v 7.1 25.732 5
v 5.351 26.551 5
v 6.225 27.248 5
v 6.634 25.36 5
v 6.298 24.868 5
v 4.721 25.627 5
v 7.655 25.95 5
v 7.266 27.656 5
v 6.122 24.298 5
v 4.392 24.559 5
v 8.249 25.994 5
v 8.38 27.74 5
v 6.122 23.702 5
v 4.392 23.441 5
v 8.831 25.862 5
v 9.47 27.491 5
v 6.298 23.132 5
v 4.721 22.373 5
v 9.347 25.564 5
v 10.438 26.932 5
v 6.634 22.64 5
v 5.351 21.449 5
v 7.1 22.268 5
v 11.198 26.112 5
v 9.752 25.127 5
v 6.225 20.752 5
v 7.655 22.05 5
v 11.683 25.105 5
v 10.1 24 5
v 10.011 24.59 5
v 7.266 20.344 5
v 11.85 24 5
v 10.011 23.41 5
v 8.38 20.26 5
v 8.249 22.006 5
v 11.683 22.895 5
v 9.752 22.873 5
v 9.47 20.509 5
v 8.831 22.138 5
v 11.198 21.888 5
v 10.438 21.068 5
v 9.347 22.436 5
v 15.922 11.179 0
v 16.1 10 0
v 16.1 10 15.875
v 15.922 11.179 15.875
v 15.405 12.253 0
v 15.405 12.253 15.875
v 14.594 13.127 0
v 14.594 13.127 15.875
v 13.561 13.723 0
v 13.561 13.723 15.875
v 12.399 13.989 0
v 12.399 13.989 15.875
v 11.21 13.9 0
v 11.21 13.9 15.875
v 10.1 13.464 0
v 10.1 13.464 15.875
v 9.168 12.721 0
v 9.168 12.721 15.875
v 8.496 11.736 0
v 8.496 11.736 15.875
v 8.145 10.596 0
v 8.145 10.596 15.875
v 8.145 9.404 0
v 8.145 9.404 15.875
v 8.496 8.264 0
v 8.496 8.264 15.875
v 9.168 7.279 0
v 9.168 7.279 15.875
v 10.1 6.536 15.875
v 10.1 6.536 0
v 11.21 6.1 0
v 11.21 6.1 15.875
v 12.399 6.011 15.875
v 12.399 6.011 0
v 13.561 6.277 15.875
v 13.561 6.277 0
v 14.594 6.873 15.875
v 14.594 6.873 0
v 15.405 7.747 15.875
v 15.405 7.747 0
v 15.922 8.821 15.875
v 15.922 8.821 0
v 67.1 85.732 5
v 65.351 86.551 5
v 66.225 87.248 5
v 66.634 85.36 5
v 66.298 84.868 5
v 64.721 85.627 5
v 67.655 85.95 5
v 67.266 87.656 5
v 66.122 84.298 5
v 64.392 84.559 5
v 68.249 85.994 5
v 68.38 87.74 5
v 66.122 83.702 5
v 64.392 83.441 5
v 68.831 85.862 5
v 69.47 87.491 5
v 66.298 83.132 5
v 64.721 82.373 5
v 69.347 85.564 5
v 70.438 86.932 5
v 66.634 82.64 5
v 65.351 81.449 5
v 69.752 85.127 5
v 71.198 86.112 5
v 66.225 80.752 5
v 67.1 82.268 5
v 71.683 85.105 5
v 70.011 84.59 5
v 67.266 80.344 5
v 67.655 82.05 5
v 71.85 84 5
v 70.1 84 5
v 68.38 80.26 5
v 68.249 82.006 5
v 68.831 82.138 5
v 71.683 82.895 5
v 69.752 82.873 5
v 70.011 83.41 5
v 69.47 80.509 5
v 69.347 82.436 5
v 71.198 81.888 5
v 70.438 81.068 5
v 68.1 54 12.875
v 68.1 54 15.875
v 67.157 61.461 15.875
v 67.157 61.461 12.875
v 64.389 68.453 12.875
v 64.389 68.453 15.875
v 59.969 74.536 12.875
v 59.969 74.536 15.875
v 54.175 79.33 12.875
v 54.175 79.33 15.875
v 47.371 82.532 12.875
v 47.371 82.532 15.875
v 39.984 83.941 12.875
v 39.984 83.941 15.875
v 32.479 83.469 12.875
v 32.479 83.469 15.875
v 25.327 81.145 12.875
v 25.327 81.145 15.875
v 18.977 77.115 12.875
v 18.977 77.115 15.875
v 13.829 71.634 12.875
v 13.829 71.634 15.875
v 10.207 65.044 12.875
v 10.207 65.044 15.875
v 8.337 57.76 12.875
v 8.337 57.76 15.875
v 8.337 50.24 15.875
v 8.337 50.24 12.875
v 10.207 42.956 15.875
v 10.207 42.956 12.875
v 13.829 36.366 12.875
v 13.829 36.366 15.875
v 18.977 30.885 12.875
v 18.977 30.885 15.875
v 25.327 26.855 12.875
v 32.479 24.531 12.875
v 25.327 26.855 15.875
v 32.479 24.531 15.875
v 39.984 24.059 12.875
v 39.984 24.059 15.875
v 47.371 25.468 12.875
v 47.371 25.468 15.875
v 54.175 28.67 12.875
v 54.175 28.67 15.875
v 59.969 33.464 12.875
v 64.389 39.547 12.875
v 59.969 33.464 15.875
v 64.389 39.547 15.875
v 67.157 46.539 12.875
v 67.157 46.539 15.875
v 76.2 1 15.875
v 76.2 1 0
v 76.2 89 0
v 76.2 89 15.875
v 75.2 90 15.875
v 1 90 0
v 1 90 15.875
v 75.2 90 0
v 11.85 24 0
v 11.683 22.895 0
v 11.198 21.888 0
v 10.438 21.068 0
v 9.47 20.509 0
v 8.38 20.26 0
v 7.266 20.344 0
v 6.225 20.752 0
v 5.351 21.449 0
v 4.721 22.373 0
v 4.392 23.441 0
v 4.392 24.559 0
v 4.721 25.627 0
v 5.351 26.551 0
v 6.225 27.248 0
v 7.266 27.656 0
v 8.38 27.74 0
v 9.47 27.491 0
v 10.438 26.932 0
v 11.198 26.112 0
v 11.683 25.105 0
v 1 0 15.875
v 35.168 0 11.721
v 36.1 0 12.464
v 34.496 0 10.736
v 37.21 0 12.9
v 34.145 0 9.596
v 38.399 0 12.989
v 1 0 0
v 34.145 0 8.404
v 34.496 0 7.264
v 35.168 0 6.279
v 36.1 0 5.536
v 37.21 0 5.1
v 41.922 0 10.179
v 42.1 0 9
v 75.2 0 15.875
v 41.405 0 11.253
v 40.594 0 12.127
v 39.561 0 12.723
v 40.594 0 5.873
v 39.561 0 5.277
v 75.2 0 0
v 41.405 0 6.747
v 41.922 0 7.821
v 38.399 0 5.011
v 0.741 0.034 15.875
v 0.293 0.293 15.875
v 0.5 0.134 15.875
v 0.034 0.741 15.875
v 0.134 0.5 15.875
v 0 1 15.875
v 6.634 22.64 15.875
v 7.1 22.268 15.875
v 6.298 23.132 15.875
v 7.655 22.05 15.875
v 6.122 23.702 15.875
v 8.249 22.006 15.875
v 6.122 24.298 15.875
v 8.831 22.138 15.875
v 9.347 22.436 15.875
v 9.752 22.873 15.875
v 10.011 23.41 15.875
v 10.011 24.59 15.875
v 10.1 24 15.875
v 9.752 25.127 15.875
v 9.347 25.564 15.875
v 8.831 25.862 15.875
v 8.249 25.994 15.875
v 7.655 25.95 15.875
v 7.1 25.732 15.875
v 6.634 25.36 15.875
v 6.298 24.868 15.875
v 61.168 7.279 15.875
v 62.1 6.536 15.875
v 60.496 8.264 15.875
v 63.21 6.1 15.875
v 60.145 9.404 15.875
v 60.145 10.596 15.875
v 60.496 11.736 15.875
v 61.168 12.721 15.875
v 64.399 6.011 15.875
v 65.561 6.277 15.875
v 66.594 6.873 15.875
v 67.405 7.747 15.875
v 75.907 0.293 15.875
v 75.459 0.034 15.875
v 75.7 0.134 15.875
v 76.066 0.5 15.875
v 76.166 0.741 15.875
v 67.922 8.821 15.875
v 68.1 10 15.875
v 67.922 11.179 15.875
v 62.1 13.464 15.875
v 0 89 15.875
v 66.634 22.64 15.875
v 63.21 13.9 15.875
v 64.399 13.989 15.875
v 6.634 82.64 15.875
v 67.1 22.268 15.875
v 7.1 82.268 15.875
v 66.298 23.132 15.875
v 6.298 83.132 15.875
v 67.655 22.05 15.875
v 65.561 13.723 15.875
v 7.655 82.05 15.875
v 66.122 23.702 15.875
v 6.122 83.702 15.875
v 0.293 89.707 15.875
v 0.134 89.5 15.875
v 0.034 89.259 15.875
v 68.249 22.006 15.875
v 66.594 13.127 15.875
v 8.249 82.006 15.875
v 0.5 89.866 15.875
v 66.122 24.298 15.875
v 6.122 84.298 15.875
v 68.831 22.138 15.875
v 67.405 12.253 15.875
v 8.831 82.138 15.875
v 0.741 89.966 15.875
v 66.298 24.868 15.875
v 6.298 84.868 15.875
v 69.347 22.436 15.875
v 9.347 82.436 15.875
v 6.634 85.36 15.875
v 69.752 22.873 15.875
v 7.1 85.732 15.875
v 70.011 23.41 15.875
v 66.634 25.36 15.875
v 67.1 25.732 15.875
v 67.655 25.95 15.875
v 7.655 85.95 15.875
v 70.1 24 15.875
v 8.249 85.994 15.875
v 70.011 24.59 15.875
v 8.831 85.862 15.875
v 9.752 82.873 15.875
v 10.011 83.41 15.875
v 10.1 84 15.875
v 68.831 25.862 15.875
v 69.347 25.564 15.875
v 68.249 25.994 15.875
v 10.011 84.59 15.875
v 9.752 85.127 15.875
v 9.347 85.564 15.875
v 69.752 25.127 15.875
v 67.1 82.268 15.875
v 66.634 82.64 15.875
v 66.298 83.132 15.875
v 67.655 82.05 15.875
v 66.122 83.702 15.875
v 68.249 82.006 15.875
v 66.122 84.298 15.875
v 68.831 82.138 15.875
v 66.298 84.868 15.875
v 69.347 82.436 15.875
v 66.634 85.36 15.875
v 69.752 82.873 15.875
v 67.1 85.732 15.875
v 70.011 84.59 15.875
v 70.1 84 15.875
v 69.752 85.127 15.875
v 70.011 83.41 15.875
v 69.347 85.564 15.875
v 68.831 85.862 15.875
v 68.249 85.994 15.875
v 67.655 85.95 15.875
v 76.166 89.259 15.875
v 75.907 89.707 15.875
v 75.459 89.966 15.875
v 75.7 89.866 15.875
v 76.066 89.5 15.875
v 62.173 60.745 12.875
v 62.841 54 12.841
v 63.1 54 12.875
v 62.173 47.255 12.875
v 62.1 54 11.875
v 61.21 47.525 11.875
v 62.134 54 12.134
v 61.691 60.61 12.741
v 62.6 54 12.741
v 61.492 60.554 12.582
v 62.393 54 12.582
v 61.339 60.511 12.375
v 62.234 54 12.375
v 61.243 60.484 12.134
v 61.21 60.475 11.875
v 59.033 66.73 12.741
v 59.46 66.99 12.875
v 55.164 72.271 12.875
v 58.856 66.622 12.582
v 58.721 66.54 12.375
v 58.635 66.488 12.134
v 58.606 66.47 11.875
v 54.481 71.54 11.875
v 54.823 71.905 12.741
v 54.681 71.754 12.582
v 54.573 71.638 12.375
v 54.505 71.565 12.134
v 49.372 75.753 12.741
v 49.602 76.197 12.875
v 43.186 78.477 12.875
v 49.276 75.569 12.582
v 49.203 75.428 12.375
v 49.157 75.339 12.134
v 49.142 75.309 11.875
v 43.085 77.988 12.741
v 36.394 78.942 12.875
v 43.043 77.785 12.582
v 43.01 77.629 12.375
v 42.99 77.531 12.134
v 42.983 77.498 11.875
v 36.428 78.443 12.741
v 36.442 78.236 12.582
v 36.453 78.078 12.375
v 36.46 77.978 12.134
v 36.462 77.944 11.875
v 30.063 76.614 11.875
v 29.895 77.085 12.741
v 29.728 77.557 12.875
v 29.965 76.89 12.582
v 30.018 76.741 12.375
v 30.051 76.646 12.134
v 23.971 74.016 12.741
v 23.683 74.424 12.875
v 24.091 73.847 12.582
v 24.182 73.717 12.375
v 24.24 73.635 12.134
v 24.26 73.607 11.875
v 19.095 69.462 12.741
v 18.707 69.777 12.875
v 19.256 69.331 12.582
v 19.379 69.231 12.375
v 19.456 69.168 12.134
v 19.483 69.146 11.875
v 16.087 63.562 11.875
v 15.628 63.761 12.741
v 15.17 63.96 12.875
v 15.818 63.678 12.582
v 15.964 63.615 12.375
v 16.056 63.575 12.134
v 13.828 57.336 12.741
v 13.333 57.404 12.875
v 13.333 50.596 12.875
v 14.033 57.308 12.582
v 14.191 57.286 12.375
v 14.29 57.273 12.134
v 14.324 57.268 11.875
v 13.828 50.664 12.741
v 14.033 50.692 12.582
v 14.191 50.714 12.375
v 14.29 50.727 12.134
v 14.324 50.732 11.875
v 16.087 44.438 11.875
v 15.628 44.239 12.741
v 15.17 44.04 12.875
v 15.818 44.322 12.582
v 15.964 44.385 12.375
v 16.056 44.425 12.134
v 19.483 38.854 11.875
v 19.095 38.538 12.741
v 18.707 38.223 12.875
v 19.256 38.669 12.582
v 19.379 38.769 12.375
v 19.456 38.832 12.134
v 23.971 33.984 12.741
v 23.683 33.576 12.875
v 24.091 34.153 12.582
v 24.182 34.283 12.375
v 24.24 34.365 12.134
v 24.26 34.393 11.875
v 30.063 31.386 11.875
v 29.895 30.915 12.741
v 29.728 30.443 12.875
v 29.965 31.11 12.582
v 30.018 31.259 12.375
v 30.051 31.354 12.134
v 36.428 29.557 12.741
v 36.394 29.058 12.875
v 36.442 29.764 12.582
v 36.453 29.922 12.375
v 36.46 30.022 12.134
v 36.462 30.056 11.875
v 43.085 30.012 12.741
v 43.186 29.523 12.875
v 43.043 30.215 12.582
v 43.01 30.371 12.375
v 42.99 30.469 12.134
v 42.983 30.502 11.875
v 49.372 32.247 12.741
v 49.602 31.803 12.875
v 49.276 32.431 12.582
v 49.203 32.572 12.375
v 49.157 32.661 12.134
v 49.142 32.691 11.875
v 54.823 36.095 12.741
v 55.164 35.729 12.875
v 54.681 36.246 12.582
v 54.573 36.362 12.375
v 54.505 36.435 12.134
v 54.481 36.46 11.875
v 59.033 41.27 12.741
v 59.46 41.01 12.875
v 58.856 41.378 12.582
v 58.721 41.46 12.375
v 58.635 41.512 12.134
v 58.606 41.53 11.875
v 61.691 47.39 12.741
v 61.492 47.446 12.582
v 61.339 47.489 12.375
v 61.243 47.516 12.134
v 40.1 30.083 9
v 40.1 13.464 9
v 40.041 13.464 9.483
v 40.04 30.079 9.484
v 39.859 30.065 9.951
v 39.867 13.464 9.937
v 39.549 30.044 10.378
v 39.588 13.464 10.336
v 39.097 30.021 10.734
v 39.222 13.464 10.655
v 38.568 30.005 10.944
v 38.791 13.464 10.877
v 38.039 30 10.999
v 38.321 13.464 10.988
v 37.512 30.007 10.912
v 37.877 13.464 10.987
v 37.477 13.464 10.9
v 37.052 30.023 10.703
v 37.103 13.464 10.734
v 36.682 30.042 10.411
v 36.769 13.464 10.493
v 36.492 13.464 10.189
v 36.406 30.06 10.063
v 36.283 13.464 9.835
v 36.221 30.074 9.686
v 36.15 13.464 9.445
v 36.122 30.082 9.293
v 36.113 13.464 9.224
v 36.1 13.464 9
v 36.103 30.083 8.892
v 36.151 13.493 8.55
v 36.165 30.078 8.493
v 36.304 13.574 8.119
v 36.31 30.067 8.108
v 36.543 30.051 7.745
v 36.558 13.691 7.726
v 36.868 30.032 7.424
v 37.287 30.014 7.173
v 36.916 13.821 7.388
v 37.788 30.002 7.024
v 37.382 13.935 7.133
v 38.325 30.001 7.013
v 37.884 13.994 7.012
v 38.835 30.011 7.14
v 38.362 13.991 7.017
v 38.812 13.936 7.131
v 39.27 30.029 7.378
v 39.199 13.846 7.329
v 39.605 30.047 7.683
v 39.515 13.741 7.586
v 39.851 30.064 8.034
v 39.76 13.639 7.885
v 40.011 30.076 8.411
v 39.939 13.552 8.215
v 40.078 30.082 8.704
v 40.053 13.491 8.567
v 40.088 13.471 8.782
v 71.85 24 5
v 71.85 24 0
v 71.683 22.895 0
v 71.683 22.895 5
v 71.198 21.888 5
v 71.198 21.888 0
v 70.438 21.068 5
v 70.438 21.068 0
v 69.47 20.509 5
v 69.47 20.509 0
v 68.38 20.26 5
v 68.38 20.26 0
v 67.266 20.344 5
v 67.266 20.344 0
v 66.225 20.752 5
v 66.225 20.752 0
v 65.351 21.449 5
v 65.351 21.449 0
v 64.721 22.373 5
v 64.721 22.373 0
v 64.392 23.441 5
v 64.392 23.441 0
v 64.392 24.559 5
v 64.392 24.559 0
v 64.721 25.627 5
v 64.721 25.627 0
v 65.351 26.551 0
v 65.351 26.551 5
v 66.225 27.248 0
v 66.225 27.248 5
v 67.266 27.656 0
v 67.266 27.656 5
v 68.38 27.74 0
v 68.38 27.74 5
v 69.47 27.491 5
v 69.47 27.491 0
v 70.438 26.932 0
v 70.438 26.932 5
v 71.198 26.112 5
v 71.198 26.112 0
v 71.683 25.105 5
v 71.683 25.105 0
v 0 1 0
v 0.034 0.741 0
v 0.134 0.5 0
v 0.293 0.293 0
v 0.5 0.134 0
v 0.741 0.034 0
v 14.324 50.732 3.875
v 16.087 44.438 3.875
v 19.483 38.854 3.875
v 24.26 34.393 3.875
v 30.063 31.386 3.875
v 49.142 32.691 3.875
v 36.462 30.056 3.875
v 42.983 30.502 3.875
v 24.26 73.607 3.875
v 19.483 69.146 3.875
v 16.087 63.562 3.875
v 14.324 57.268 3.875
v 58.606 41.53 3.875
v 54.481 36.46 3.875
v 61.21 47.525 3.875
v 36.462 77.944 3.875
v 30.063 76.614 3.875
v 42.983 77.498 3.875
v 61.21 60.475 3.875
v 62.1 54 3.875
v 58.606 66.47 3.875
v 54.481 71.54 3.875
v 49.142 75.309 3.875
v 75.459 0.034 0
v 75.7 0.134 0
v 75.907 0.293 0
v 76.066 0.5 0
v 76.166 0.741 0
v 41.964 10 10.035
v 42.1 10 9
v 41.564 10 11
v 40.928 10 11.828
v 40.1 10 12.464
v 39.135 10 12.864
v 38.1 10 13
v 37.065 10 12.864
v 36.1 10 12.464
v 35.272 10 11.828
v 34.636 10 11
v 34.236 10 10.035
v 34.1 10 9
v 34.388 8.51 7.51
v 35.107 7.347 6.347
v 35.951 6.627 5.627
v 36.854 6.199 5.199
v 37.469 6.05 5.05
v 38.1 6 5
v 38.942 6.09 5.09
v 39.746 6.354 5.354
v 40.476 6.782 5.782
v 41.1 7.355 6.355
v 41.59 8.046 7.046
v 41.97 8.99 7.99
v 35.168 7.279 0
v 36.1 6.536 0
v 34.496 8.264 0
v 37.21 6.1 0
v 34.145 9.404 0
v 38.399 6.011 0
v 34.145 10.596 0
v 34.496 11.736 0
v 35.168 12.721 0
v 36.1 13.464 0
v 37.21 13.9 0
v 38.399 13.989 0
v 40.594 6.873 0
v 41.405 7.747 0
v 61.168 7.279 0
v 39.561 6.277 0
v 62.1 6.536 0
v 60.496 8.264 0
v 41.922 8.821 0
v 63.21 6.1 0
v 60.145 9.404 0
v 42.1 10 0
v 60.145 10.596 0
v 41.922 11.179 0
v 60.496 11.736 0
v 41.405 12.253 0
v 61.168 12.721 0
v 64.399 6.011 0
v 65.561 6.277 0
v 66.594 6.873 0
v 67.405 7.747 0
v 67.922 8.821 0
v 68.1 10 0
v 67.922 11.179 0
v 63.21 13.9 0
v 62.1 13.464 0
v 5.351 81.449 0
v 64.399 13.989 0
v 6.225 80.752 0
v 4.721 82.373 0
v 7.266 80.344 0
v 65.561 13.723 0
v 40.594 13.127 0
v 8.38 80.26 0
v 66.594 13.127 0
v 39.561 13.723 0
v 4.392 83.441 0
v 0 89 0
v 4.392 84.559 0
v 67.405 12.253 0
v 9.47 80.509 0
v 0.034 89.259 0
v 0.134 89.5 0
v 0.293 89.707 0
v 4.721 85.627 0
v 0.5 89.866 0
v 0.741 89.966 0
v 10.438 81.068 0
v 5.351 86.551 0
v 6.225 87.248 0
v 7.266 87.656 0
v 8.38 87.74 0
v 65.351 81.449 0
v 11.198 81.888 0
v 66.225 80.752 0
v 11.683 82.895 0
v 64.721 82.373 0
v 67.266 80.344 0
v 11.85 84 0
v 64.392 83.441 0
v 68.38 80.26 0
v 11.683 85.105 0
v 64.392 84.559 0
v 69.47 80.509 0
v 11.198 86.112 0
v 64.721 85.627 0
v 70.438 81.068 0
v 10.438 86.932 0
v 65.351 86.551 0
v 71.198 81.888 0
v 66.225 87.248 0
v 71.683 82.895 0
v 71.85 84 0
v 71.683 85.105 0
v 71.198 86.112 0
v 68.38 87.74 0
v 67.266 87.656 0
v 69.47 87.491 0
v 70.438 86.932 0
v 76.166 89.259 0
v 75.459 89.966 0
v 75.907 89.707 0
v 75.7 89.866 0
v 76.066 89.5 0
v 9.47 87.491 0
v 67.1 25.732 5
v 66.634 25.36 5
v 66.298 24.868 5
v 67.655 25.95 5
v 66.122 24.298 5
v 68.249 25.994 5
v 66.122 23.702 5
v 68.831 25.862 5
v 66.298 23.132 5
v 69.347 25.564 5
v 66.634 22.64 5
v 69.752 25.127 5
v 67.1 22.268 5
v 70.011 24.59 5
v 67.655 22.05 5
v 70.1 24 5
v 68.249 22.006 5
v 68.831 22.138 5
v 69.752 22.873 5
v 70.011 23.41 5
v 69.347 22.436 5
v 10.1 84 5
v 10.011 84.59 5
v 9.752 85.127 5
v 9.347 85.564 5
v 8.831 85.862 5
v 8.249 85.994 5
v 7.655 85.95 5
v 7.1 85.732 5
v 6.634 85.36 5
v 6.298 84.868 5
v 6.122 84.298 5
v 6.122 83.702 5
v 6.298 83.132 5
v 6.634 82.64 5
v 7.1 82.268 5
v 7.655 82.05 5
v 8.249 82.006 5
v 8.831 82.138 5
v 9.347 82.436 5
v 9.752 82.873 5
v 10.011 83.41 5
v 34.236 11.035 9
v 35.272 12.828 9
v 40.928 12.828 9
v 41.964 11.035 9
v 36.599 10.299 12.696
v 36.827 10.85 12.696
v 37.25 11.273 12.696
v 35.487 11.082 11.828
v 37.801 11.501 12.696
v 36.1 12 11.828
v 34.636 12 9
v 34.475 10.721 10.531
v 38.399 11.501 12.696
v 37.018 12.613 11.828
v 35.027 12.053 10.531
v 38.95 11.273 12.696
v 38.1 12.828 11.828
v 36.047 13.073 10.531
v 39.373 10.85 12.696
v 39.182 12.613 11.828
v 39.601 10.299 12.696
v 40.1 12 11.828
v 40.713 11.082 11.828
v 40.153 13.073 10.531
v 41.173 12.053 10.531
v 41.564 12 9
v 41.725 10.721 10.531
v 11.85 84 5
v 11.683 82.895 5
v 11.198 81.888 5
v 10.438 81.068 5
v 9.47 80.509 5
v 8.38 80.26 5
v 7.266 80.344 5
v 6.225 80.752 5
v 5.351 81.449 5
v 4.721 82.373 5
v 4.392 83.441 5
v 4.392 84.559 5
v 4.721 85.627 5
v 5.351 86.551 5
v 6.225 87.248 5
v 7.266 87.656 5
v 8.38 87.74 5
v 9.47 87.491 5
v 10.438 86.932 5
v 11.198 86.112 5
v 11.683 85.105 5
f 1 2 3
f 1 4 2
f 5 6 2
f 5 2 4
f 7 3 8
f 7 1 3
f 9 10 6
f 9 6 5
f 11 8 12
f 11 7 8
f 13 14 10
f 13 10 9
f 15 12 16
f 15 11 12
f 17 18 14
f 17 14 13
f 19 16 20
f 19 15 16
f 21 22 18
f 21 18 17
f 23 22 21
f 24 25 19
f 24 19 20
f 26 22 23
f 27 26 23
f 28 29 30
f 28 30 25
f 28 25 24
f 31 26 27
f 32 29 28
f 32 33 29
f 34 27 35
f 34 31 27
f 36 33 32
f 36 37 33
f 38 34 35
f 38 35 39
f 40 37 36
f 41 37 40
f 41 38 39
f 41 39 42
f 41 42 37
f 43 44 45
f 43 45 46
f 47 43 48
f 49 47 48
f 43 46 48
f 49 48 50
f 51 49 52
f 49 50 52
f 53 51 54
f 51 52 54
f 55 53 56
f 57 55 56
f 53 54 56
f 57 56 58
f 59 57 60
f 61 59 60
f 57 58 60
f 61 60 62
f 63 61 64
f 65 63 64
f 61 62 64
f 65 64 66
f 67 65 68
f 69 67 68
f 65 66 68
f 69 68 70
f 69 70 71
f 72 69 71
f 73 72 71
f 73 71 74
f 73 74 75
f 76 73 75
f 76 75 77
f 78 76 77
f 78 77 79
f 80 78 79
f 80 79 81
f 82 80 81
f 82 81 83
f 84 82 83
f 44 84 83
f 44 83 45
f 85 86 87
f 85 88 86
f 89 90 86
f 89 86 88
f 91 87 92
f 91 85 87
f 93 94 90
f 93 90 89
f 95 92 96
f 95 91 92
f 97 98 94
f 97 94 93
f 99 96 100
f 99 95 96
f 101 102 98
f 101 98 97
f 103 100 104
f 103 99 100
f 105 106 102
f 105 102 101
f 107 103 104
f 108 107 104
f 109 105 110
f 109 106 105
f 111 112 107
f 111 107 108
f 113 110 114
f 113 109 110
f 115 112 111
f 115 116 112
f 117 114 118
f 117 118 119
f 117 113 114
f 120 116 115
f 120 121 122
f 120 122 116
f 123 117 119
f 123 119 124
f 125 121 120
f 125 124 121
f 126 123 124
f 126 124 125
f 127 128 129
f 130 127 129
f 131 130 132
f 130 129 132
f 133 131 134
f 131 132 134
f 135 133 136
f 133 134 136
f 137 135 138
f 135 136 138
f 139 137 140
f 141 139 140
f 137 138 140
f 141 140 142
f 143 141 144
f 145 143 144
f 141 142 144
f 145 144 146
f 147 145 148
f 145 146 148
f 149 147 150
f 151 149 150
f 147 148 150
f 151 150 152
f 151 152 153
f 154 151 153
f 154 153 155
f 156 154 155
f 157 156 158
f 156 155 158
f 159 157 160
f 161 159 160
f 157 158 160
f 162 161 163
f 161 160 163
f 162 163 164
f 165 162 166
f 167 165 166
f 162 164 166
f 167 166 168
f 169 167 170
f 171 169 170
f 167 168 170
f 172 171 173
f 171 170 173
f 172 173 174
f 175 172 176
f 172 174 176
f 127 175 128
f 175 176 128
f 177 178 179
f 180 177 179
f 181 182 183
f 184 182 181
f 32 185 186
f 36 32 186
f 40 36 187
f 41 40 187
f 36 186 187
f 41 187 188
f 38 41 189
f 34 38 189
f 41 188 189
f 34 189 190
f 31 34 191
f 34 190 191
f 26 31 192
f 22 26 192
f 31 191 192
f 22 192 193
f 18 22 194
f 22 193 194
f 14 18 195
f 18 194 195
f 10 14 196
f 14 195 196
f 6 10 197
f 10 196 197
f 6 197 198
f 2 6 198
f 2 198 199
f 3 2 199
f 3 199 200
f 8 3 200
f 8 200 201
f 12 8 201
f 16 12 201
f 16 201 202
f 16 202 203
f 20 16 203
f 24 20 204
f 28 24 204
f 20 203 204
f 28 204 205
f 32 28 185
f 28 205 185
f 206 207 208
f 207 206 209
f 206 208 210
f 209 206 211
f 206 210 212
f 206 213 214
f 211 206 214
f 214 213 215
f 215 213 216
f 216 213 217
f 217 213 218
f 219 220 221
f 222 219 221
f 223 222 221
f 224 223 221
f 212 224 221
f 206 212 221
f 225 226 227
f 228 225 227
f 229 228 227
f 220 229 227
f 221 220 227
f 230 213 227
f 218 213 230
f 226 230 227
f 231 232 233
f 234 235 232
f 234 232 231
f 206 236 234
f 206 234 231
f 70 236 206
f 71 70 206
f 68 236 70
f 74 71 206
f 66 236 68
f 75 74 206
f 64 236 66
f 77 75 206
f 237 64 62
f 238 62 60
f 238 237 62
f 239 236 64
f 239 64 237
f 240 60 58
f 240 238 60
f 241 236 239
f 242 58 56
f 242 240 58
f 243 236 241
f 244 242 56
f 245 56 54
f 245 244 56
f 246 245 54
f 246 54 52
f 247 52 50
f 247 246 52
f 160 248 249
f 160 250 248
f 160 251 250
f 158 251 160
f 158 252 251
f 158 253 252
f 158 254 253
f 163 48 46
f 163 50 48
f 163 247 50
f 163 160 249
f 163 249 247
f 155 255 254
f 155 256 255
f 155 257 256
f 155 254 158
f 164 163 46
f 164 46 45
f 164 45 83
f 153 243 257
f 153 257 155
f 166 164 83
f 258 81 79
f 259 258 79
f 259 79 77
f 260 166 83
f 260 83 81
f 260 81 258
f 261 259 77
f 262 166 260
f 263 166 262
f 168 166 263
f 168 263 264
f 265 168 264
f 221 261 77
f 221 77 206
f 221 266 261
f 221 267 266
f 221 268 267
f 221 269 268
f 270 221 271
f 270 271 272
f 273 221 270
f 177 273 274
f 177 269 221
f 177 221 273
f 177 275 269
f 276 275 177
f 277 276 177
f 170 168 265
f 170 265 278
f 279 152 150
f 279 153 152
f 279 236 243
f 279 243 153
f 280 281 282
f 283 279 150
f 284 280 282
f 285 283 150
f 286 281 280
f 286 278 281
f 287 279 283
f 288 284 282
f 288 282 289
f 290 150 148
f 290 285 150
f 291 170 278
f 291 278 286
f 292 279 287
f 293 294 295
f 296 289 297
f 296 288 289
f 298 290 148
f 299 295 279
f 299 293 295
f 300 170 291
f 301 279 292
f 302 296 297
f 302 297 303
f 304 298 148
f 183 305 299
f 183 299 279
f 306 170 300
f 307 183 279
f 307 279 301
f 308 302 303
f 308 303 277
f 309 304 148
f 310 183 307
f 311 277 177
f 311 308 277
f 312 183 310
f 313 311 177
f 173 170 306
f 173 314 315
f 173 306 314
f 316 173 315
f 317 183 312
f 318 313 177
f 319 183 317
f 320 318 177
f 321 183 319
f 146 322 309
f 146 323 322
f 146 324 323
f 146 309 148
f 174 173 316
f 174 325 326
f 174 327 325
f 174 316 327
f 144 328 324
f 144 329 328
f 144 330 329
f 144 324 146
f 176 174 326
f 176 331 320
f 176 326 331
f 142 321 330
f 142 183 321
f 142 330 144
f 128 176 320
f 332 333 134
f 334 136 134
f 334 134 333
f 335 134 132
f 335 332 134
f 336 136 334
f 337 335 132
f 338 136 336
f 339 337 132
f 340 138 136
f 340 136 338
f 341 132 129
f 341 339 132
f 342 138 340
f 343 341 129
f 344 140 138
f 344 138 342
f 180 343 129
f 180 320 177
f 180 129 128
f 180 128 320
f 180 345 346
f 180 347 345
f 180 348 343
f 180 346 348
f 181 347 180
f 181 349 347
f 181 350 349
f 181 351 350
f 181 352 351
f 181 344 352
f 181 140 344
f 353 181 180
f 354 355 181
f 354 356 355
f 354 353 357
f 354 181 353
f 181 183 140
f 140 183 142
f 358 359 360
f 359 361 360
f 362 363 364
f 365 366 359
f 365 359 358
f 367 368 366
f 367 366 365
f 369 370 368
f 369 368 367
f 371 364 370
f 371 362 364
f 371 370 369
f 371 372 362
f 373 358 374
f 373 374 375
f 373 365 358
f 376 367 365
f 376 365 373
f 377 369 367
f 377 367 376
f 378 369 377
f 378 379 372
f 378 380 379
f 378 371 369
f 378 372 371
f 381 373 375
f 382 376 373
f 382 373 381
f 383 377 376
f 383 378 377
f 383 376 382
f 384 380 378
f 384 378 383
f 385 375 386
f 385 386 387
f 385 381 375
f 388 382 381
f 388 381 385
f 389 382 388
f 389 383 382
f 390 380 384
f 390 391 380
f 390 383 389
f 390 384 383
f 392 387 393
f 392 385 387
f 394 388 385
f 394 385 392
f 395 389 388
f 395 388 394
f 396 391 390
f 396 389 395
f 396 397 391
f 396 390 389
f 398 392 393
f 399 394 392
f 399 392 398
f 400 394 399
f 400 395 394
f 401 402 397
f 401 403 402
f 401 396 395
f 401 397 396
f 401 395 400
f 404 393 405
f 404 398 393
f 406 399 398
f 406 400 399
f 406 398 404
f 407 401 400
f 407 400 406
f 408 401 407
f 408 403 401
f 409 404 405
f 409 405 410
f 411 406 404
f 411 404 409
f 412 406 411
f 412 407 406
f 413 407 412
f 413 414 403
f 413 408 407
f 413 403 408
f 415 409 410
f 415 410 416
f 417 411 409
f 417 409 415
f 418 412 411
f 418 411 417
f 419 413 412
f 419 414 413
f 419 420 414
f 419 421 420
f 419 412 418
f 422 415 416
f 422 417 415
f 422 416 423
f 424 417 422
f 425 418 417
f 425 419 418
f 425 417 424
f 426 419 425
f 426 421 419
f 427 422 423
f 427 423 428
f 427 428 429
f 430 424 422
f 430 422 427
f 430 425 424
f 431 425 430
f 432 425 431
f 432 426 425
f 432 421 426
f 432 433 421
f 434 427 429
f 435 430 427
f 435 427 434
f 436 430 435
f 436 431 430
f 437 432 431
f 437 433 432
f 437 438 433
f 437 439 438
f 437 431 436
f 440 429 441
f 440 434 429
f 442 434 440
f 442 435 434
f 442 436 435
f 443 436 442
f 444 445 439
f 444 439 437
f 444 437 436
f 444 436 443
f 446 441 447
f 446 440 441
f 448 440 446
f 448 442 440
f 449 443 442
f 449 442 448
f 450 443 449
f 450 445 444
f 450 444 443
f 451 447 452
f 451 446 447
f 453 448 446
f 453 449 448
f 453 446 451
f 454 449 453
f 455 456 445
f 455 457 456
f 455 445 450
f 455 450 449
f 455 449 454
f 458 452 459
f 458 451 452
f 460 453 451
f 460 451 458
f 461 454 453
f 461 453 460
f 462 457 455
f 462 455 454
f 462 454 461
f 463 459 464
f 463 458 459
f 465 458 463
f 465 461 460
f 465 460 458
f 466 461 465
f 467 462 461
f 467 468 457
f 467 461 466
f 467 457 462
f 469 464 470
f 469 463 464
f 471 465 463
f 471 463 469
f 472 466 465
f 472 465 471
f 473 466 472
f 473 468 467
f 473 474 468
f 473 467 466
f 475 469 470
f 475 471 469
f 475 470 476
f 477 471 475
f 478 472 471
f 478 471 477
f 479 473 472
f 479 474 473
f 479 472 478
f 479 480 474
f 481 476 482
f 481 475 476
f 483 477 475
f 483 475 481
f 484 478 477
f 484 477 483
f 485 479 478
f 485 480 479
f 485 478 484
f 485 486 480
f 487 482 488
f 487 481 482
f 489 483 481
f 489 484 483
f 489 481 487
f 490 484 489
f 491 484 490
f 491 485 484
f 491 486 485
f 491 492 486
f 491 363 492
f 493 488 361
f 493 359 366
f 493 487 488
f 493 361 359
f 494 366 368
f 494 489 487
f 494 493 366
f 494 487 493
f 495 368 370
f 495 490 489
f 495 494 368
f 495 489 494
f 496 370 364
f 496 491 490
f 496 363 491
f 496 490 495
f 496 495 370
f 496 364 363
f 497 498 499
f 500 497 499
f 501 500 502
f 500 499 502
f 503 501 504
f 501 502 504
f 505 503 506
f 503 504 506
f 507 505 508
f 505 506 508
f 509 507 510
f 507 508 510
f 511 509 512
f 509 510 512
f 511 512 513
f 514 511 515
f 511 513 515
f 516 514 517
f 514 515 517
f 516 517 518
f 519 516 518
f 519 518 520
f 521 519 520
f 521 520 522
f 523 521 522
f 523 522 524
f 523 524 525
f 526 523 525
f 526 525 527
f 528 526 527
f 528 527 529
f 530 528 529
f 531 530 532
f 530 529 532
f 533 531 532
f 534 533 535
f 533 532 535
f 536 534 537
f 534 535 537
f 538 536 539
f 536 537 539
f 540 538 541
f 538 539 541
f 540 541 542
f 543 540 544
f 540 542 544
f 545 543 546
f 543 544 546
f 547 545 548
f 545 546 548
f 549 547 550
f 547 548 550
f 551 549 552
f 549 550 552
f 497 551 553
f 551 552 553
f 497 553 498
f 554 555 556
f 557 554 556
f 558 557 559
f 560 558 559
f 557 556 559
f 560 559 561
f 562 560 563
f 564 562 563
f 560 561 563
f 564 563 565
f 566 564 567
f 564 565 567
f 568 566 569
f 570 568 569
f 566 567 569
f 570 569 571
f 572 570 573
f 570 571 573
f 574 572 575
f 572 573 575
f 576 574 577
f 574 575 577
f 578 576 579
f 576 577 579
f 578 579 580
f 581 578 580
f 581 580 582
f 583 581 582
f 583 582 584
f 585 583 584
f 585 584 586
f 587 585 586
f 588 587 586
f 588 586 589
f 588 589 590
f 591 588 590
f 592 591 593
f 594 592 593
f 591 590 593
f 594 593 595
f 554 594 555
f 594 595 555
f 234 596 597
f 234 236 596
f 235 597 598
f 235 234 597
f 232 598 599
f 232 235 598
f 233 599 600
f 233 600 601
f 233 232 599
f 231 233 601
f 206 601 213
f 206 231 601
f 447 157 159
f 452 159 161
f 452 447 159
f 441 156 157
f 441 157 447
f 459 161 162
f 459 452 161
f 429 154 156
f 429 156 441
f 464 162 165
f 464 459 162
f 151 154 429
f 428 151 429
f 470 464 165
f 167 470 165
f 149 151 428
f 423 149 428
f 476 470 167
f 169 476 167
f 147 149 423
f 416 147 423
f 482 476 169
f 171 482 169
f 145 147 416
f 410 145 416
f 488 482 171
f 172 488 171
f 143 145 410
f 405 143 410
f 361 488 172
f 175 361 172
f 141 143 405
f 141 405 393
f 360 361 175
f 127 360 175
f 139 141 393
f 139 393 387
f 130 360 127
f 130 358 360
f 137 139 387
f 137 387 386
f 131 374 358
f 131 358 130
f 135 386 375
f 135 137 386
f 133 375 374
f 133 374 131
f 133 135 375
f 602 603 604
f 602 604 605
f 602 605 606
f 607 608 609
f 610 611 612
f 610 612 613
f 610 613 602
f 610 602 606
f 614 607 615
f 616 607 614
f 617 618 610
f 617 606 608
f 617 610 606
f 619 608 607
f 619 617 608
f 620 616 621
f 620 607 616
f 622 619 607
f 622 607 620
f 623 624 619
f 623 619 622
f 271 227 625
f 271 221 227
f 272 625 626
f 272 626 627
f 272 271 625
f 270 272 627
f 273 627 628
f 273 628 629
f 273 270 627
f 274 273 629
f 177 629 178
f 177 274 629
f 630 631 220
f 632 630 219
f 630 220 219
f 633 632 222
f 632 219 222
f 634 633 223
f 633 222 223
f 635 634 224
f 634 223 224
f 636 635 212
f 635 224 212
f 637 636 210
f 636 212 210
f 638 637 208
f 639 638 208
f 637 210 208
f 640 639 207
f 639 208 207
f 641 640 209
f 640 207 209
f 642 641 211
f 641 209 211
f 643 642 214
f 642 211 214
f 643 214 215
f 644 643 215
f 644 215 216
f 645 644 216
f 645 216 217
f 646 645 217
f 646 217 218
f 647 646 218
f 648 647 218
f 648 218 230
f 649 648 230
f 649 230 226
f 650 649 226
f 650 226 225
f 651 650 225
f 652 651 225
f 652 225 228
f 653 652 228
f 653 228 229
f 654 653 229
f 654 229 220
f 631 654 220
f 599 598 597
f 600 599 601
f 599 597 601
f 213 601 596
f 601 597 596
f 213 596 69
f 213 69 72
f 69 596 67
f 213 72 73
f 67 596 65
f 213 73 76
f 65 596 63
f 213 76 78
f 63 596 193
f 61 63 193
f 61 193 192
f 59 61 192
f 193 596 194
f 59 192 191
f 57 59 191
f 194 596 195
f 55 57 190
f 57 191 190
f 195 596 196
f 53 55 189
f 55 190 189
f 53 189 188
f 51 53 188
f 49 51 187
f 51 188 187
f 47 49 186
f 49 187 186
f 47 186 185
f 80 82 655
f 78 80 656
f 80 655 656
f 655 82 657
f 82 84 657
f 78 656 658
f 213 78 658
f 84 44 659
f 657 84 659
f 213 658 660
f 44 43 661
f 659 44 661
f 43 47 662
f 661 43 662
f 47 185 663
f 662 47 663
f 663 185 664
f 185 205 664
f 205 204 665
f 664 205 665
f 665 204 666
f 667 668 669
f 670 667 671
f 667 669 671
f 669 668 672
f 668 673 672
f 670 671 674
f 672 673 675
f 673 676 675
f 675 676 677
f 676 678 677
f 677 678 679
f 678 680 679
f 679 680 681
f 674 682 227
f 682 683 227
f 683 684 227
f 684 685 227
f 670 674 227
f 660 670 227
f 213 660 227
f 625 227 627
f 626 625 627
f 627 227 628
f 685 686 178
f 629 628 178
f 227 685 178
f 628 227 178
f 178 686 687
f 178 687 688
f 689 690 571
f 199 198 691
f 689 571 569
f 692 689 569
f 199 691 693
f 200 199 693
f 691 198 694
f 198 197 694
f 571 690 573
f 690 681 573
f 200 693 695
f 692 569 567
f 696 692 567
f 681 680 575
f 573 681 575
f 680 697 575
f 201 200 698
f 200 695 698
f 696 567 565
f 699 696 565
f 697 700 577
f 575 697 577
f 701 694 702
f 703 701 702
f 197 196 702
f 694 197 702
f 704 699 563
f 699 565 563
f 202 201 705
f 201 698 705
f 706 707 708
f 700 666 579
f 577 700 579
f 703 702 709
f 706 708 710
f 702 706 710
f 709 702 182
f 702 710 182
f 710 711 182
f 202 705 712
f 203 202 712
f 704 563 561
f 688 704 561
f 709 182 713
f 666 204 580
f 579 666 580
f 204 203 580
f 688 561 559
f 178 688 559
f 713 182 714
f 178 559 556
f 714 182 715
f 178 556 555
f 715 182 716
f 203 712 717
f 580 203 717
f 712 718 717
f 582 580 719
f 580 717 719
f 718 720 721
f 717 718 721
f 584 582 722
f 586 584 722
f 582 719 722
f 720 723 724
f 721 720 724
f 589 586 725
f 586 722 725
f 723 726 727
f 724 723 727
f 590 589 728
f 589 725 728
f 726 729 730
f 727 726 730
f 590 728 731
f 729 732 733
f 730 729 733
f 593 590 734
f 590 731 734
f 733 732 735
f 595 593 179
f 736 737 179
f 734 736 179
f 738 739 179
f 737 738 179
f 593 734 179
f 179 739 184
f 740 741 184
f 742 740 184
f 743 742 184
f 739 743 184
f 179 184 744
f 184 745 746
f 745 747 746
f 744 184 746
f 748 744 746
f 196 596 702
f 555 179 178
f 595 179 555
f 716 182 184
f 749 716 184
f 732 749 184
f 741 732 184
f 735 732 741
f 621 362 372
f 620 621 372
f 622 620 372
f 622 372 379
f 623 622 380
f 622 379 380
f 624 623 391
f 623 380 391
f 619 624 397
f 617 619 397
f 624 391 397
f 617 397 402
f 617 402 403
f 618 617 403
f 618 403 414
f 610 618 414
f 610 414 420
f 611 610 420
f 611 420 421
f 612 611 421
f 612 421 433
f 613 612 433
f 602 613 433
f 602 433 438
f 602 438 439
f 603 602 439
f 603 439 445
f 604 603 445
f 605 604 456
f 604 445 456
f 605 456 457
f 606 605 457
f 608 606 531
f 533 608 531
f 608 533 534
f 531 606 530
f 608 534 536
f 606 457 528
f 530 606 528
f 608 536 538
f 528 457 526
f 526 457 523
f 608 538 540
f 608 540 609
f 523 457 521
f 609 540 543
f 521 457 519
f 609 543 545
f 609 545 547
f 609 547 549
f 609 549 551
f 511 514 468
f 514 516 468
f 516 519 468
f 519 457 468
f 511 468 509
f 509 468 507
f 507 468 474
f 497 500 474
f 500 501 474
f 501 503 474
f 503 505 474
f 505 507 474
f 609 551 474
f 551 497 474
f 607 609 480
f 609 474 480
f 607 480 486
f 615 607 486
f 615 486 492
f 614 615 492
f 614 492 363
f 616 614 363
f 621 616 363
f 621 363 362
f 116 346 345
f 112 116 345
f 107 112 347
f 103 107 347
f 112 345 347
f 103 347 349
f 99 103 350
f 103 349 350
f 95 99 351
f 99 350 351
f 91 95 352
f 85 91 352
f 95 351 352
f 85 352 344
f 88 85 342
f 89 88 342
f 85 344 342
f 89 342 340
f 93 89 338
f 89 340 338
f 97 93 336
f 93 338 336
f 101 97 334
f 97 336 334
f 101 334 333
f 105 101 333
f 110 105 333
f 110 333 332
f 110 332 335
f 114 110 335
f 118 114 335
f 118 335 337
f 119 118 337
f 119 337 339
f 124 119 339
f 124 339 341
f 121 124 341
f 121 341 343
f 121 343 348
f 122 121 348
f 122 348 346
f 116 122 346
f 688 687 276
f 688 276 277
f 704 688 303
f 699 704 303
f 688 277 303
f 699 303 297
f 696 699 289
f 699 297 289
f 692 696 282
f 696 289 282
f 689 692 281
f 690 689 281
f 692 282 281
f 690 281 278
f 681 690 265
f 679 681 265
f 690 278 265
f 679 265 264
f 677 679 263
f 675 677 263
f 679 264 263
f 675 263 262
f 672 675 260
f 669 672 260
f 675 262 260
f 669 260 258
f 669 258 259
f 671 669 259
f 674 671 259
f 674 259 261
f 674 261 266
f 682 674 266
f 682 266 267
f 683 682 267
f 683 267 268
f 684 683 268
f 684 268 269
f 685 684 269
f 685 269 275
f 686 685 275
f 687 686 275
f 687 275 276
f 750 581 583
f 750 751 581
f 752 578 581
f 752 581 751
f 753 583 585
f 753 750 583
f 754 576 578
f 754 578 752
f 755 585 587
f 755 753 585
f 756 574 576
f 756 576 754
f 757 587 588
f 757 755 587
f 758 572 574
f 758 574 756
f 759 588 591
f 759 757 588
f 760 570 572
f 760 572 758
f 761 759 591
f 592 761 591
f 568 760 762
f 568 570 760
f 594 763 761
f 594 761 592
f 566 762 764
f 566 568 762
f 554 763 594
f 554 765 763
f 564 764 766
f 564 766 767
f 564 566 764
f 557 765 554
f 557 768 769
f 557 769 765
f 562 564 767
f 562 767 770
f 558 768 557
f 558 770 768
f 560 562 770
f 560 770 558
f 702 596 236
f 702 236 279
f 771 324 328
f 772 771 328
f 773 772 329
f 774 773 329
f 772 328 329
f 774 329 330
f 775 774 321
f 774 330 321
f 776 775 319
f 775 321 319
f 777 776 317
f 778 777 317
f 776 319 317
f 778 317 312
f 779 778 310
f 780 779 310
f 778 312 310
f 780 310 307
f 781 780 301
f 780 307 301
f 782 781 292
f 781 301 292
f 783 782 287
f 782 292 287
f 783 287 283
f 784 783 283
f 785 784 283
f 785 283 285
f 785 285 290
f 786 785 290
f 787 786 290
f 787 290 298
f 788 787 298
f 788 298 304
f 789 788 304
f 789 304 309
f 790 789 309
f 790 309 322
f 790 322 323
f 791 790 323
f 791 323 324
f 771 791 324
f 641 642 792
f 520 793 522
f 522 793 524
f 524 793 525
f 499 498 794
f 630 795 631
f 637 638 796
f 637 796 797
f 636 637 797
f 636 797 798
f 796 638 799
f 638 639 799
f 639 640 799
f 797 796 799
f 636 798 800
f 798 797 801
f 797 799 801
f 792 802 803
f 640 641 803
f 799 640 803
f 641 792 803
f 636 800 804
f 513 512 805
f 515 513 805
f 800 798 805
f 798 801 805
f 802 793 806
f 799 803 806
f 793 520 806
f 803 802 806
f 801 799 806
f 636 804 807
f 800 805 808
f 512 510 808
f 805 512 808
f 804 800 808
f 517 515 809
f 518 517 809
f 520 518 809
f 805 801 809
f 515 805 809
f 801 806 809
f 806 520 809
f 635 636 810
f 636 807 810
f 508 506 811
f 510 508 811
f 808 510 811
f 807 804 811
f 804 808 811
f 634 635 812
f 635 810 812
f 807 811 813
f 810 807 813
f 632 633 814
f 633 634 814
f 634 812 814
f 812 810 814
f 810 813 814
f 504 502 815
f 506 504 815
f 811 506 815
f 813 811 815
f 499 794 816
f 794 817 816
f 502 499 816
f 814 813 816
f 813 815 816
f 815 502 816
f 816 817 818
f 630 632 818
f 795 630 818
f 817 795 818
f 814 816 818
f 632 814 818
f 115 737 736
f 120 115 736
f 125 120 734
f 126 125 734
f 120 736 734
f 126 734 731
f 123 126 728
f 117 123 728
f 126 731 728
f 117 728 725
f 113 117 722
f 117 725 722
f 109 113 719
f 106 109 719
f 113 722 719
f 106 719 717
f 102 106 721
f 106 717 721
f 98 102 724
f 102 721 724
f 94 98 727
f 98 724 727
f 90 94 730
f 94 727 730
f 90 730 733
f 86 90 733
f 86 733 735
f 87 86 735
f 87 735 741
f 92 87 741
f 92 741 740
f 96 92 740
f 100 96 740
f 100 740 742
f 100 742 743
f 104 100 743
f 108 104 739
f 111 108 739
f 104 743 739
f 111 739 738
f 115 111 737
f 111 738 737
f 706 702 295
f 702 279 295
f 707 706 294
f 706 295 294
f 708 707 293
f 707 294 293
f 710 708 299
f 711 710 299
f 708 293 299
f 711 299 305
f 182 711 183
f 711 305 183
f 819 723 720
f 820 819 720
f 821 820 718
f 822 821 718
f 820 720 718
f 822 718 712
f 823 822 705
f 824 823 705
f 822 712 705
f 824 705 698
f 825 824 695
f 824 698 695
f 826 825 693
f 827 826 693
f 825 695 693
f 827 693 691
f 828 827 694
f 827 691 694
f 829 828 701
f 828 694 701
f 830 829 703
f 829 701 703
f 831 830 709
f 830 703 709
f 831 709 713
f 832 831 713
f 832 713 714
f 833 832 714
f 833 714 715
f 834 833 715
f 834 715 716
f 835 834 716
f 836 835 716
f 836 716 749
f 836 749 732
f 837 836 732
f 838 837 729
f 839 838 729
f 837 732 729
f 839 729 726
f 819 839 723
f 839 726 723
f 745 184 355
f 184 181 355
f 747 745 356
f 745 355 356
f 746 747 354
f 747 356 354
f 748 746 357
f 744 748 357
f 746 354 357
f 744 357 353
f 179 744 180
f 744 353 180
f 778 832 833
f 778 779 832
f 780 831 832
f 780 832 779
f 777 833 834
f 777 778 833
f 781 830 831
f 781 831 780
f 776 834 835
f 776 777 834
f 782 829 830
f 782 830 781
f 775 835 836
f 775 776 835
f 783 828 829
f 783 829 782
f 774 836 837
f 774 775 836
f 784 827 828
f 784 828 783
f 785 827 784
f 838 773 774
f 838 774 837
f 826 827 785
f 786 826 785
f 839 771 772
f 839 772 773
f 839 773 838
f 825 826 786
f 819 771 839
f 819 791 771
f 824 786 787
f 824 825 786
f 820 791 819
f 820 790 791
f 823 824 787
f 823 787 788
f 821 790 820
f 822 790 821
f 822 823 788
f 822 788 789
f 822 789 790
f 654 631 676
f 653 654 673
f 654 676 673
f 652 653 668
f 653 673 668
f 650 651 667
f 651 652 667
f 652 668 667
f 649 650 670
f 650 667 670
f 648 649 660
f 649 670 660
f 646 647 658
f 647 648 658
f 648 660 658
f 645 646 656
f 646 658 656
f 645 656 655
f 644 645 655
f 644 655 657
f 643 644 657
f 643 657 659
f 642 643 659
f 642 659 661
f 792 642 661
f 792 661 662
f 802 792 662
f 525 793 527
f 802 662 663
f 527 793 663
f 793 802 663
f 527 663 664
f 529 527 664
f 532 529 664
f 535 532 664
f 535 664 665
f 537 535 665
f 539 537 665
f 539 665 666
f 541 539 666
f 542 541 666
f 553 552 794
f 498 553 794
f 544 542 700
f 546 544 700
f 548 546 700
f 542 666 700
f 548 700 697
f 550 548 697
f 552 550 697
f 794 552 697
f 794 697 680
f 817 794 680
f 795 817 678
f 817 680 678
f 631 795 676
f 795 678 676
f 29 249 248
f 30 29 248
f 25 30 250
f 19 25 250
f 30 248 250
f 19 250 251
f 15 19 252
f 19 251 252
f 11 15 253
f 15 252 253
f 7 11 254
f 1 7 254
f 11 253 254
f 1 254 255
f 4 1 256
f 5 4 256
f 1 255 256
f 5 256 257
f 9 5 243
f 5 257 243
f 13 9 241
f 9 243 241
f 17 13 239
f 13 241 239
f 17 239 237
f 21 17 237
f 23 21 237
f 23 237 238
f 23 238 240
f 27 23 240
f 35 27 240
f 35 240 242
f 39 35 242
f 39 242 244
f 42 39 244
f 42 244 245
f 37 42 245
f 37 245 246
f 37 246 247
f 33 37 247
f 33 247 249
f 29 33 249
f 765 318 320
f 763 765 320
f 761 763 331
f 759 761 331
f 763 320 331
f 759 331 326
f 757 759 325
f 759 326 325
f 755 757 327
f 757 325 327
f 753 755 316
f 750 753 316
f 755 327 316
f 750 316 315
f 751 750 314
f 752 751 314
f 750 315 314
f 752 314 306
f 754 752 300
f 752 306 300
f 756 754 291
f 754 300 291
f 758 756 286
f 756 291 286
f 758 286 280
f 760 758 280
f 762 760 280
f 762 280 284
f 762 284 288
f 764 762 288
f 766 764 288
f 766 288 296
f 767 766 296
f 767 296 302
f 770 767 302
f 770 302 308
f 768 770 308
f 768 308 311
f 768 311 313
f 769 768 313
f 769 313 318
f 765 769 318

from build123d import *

# Parameters (mm, degrees)
F0_W      = 76.2
F0_H      = 90
F1_DEPTH  = 15.875
F2_R      = 24
F3_DEPTH  = 12
F4_R      = 30
F4_R_2    = 24
F5_DEPTH  = 3
F6_R      = 4
F7_DEPTH  = 10
F8_R      = 4
F9_DEPTH  = 9
F12_R     = 2
F13_DEPTH = 50
F14_R     = 1
F15_R     = 2
F15_R_2   = 4
F16_DEPTH = 16
F17_R     = 3.75
F18_DEPTH = 5


with BuildPart() as f1:
    # F0 (on Top) → F1 (new body)
    with BuildSketch(Plane.XY):
        with Locations((38.1, 45)):
            Rectangle(F0_W, F0_H)
    extrude(amount=F1_DEPTH)

    # F2 (on face) → F3 (cut)
    with BuildSketch(Plane.XY.offset(15.875)):
        with Locations((38.1, 54)):
            Circle(F2_R)
    extrude(amount=-F3_DEPTH, mode=Mode.SUBTRACT)

    # F4 (on face) → F5 (cut)
    with BuildSketch(Plane.XY.offset(15.875)):
        with Locations((38.1, 54)):
            Circle(F4_R)
        with Locations((38.1, 54)):
            Circle(F4_R_2, mode=Mode.SUBTRACT)
    extrude(amount=-F5_DEPTH, mode=Mode.SUBTRACT)

    # F6 (on face) → F7 (cut)
    with BuildSketch(Plane.XZ):
        with Locations((38.1, 9)):
            Circle(F6_R)
    extrude(amount=-F7_DEPTH, mode=Mode.SUBTRACT)

    # F8 (on face) → F9 (cut)
    with BuildSketch(Plane(origin=(0, 0, 0), x_dir=(1, 0, 0), z_dir=(0, 0, -1))):
        with Locations((38.1, -10)):
            Circle(F8_R)
    extrude(amount=-F9_DEPTH, mode=Mode.SUBTRACT)

    # F10 (on face) → F11 (revolve, cut)
    with BuildSketch(Plane.XZ.offset(-10)):
        with BuildLine():
            Line((38.1, 9), (38.1, 13))
            ThreePointArc((38.1, 13), (35.2715728753, 11.8284271247), (34.1, 9))
            Line((34.1, 9), (38.1, 9))
        make_face()
    revolve(axis=Axis((38.1, 10, 9), (0, 0, -1)), mode=Mode.SUBTRACT)

    # F12 (on face) → F13 (cut)
    with BuildSketch(Plane.XZ):
        with Locations((38.1, 9)):
            Circle(F12_R)
    extrude(amount=-F13_DEPTH, mode=Mode.SUBTRACT)

    # F14
    f14_edges = [f1.edges().sort_by_distance(p)[0] for p in [
        (14.1, 54, 12.875),
        (0, 90, 7.9375),
        (0, 0, 7.9375),
        (76.2, 90, 7.9375),
        (76.2, 0, 7.9375),
    ]]
    fillet(f14_edges, radius=F14_R)

    # F15 (on face) → F16 (cut)
    with BuildSketch(Plane.XY.offset(15.875)):
        with Locations((8.1, 84)):
            Circle(F15_R)
        with Locations((68.1, 84)):
            Circle(F15_R)
        with Locations((8.1, 24)):
            Circle(F15_R)
        with Locations((68.1, 24)):
            Circle(F15_R)
        with Locations((12.1, 10)):
            Circle(F15_R_2)
        with Locations((64.1, 10)):
            Circle(F15_R_2)
    extrude(amount=-F16_DEPTH, mode=Mode.SUBTRACT)

    # F17 (on face) → F18 (cut)
    with BuildSketch(Plane(origin=(0, 0, 0), x_dir=(1, 0, 0), z_dir=(0, 0, -1))):
        with Locations((8.1, -24)):
            Circle(F17_R)
        with Locations((68.1, -24)):
            Circle(F17_R)
        with Locations((8.1, -84)):
            Circle(F17_R)
        with Locations((68.1, -84)):
            Circle(F17_R)
    extrude(amount=-F18_DEPTH, mode=Mode.SUBTRACT)


solid = f1.part
